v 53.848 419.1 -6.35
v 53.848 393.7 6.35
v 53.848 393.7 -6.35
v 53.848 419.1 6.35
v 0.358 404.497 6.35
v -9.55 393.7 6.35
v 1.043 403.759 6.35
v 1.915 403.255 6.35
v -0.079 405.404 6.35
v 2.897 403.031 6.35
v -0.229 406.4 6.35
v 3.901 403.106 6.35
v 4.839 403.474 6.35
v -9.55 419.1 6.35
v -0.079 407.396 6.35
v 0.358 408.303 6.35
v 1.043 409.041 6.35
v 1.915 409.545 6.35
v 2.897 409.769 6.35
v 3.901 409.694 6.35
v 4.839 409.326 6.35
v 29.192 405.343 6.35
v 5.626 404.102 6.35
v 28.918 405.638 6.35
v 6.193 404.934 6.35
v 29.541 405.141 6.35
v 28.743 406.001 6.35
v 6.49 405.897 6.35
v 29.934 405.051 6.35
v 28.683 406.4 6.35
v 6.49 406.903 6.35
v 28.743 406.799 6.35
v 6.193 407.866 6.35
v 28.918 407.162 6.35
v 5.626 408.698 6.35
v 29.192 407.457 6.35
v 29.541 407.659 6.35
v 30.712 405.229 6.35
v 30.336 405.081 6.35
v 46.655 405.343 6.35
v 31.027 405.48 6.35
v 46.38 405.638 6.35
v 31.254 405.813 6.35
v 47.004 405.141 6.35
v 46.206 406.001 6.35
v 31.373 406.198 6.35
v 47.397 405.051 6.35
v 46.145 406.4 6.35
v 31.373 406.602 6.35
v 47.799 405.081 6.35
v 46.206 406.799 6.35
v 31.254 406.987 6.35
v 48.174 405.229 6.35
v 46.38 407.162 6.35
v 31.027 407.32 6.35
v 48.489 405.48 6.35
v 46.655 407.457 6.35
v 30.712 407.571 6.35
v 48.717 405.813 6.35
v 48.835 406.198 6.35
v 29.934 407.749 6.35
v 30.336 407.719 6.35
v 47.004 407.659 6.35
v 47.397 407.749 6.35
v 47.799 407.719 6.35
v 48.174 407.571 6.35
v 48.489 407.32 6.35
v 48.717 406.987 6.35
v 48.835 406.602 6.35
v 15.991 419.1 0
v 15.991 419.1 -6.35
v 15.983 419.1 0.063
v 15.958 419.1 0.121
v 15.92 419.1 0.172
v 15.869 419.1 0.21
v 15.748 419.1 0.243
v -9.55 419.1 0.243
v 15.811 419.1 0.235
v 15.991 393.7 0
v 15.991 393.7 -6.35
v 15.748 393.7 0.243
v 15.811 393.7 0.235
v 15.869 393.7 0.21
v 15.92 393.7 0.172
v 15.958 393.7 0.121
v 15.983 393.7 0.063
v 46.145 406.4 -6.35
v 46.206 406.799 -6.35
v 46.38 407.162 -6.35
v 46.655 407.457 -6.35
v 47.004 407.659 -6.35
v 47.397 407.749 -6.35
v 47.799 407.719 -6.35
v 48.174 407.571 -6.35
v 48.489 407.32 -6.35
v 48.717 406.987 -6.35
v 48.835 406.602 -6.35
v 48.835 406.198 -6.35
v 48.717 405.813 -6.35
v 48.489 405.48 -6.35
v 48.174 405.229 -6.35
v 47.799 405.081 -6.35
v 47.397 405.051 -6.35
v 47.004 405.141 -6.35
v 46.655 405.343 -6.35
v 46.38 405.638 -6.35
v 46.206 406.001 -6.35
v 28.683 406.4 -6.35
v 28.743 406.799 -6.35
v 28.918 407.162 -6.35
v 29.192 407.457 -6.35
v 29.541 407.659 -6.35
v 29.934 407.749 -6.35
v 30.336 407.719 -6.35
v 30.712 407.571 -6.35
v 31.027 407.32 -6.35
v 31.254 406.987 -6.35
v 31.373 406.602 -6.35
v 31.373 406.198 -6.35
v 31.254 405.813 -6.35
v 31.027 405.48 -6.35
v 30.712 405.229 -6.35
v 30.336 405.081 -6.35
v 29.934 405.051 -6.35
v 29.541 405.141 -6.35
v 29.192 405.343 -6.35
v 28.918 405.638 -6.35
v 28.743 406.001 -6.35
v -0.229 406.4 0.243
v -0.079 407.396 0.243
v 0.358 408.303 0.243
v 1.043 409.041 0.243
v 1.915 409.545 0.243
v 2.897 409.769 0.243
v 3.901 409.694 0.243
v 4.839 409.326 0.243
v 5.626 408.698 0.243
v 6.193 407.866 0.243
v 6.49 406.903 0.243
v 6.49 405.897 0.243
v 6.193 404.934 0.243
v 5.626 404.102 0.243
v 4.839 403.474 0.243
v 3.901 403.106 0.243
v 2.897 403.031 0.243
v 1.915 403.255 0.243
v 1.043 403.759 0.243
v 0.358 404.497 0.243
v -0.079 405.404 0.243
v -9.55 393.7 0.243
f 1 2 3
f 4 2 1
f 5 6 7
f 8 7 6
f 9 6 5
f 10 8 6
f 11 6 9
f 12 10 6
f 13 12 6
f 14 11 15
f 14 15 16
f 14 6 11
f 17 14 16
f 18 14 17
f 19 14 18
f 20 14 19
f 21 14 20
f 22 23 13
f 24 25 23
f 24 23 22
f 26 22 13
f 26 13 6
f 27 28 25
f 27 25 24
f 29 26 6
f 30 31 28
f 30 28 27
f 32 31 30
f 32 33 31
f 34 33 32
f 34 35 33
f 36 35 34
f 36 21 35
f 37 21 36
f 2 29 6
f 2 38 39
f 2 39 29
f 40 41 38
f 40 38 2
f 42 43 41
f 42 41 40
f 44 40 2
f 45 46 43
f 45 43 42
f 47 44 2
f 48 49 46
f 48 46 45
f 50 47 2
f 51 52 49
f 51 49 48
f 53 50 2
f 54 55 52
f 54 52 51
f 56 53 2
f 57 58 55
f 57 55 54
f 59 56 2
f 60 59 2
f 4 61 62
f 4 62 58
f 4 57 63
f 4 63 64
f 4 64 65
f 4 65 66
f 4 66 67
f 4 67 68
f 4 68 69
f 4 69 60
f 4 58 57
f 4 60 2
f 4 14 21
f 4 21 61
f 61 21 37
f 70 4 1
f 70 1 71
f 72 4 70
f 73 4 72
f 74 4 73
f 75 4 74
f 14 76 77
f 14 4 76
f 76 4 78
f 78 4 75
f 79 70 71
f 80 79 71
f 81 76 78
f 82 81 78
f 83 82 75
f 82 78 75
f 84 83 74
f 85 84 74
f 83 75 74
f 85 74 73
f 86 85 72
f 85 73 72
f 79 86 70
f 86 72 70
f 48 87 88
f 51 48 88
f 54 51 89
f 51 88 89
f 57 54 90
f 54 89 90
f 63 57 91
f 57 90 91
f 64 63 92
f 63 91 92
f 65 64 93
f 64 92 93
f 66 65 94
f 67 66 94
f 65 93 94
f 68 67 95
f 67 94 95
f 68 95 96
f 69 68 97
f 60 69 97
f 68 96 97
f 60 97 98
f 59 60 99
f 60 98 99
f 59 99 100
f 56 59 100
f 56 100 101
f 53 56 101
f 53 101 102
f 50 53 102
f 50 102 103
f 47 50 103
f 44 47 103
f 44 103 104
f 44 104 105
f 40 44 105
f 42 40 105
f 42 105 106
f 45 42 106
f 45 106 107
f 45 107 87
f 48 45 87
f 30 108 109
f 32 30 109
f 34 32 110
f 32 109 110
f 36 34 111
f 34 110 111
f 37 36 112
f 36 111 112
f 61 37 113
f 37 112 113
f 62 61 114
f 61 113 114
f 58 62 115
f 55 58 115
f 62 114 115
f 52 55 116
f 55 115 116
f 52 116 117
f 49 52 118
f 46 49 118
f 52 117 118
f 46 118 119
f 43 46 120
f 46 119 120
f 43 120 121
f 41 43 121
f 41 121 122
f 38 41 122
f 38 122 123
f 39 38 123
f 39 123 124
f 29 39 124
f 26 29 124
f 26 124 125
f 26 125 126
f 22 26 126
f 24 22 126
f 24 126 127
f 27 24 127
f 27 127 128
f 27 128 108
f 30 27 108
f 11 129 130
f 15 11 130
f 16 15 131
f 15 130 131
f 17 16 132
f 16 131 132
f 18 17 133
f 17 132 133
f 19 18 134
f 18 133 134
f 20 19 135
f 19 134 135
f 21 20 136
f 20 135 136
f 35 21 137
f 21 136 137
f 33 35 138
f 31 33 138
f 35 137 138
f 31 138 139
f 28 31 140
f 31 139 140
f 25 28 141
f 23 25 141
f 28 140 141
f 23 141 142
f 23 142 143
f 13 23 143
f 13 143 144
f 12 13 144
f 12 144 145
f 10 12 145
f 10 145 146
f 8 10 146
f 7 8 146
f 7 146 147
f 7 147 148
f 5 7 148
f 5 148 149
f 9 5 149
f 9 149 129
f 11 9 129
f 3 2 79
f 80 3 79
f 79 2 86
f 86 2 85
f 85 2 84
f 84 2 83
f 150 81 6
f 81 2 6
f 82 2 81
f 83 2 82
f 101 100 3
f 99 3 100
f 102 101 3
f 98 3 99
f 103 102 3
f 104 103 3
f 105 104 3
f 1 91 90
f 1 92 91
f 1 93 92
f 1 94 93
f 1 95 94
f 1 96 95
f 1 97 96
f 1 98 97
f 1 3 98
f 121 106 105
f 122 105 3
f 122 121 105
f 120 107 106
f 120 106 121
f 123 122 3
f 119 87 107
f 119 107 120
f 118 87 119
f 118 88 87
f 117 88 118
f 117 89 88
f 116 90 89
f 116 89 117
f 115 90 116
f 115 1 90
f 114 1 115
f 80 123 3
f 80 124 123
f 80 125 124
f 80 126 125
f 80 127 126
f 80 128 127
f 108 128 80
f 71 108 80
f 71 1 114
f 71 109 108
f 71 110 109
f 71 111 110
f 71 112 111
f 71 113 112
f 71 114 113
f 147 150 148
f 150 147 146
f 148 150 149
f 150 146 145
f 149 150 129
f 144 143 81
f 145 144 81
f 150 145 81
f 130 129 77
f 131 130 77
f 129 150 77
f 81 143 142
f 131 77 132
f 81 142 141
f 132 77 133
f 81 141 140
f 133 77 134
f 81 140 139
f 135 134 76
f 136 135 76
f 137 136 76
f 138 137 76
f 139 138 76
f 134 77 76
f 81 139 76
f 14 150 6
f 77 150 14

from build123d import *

# Parameters (mm, degrees)
SKETCH1_W                 = 63.398443118
SKETCH1_H                 = 25.4
BOSS_EXTRUDE1_DEPTH       = 6.35
SKETCH2_W                 = 38.1
SKETCH2_H                 = 25.4
BOSS_EXTRUDE2_DEPTH       = 6.35
CUT_EXTRUDE3_DEPTH        = 60.875617776
TAP_DRILL_FOR_6_32_TAP1_D = 2.7051
F_1_4_CLEARANCE_HOLE1_D   = 6.7564


with BuildPart() as part:
    # Sketch1 → Boss-Extrude1 (new body)
    with BuildSketch(Plane.XY):
        with Locations((22.148778441, 406.4)):
            Rectangle(SKETCH1_W, SKETCH1_H)
    extrude(amount=BOSS_EXTRUDE1_DEPTH)

    # Sketch2 → Boss-Extrude2 (add)
    with BuildSketch(Plane(origin=(0, 0, 0), x_dir=(-1, 0, 0), z_dir=(0, 0, -1))):
        with Locations((-34.798, 406.4)):
            Rectangle(SKETCH2_W, SKETCH2_H)
    extrude(amount=BOSS_EXTRUDE2_DEPTH)

    # Sketch7 → Cut-Extrude3 (cut, through all)
    with BuildSketch(Plane(origin=(0, 419.1, 0), x_dir=(1, 0, 0), z_dir=(0, 1, 0))):
        with BuildLine():
            Line((-9.550443118, -0.242852773), (15.748, -0.242852773))
            ThreePointArc((15.748, -0.242852773), (15.919722843, -0.171722843), (15.990852773, 0))
            Line((15.990852773, 0), (15.990852773, 6.35))
            Line((15.990852773, 6.35), (15.748, 6.35))
            Line((15.748, 6.35), (15.748, 0))
            Line((15.748, 0), (-9.550443118, 0))
            Line((-9.550443118, 0), (-9.550443118, -0.242852773))
        make_face()
    extrude(amount=-CUT_EXTRUDE3_DEPTH, mode=Mode.SUBTRACT)

    # Tap Drill for #6-32 Tap1 (through all)
    with Locations(Plane.XY.offset(6.35)):
        with Locations((47.498, 406.4), (30.0355, 406.4)):
            Hole(TAP_DRILL_FOR_6_32_TAP1_D / 2)

    # 1/4 Clearance Hole1 (through all)
    with Locations(Plane.XY.offset(6.35)):
        with Locations((3.149556882, 406.4)):
            Hole(F_1_4_CLEARANCE_HOLE1_D / 2)


solid = part.part
